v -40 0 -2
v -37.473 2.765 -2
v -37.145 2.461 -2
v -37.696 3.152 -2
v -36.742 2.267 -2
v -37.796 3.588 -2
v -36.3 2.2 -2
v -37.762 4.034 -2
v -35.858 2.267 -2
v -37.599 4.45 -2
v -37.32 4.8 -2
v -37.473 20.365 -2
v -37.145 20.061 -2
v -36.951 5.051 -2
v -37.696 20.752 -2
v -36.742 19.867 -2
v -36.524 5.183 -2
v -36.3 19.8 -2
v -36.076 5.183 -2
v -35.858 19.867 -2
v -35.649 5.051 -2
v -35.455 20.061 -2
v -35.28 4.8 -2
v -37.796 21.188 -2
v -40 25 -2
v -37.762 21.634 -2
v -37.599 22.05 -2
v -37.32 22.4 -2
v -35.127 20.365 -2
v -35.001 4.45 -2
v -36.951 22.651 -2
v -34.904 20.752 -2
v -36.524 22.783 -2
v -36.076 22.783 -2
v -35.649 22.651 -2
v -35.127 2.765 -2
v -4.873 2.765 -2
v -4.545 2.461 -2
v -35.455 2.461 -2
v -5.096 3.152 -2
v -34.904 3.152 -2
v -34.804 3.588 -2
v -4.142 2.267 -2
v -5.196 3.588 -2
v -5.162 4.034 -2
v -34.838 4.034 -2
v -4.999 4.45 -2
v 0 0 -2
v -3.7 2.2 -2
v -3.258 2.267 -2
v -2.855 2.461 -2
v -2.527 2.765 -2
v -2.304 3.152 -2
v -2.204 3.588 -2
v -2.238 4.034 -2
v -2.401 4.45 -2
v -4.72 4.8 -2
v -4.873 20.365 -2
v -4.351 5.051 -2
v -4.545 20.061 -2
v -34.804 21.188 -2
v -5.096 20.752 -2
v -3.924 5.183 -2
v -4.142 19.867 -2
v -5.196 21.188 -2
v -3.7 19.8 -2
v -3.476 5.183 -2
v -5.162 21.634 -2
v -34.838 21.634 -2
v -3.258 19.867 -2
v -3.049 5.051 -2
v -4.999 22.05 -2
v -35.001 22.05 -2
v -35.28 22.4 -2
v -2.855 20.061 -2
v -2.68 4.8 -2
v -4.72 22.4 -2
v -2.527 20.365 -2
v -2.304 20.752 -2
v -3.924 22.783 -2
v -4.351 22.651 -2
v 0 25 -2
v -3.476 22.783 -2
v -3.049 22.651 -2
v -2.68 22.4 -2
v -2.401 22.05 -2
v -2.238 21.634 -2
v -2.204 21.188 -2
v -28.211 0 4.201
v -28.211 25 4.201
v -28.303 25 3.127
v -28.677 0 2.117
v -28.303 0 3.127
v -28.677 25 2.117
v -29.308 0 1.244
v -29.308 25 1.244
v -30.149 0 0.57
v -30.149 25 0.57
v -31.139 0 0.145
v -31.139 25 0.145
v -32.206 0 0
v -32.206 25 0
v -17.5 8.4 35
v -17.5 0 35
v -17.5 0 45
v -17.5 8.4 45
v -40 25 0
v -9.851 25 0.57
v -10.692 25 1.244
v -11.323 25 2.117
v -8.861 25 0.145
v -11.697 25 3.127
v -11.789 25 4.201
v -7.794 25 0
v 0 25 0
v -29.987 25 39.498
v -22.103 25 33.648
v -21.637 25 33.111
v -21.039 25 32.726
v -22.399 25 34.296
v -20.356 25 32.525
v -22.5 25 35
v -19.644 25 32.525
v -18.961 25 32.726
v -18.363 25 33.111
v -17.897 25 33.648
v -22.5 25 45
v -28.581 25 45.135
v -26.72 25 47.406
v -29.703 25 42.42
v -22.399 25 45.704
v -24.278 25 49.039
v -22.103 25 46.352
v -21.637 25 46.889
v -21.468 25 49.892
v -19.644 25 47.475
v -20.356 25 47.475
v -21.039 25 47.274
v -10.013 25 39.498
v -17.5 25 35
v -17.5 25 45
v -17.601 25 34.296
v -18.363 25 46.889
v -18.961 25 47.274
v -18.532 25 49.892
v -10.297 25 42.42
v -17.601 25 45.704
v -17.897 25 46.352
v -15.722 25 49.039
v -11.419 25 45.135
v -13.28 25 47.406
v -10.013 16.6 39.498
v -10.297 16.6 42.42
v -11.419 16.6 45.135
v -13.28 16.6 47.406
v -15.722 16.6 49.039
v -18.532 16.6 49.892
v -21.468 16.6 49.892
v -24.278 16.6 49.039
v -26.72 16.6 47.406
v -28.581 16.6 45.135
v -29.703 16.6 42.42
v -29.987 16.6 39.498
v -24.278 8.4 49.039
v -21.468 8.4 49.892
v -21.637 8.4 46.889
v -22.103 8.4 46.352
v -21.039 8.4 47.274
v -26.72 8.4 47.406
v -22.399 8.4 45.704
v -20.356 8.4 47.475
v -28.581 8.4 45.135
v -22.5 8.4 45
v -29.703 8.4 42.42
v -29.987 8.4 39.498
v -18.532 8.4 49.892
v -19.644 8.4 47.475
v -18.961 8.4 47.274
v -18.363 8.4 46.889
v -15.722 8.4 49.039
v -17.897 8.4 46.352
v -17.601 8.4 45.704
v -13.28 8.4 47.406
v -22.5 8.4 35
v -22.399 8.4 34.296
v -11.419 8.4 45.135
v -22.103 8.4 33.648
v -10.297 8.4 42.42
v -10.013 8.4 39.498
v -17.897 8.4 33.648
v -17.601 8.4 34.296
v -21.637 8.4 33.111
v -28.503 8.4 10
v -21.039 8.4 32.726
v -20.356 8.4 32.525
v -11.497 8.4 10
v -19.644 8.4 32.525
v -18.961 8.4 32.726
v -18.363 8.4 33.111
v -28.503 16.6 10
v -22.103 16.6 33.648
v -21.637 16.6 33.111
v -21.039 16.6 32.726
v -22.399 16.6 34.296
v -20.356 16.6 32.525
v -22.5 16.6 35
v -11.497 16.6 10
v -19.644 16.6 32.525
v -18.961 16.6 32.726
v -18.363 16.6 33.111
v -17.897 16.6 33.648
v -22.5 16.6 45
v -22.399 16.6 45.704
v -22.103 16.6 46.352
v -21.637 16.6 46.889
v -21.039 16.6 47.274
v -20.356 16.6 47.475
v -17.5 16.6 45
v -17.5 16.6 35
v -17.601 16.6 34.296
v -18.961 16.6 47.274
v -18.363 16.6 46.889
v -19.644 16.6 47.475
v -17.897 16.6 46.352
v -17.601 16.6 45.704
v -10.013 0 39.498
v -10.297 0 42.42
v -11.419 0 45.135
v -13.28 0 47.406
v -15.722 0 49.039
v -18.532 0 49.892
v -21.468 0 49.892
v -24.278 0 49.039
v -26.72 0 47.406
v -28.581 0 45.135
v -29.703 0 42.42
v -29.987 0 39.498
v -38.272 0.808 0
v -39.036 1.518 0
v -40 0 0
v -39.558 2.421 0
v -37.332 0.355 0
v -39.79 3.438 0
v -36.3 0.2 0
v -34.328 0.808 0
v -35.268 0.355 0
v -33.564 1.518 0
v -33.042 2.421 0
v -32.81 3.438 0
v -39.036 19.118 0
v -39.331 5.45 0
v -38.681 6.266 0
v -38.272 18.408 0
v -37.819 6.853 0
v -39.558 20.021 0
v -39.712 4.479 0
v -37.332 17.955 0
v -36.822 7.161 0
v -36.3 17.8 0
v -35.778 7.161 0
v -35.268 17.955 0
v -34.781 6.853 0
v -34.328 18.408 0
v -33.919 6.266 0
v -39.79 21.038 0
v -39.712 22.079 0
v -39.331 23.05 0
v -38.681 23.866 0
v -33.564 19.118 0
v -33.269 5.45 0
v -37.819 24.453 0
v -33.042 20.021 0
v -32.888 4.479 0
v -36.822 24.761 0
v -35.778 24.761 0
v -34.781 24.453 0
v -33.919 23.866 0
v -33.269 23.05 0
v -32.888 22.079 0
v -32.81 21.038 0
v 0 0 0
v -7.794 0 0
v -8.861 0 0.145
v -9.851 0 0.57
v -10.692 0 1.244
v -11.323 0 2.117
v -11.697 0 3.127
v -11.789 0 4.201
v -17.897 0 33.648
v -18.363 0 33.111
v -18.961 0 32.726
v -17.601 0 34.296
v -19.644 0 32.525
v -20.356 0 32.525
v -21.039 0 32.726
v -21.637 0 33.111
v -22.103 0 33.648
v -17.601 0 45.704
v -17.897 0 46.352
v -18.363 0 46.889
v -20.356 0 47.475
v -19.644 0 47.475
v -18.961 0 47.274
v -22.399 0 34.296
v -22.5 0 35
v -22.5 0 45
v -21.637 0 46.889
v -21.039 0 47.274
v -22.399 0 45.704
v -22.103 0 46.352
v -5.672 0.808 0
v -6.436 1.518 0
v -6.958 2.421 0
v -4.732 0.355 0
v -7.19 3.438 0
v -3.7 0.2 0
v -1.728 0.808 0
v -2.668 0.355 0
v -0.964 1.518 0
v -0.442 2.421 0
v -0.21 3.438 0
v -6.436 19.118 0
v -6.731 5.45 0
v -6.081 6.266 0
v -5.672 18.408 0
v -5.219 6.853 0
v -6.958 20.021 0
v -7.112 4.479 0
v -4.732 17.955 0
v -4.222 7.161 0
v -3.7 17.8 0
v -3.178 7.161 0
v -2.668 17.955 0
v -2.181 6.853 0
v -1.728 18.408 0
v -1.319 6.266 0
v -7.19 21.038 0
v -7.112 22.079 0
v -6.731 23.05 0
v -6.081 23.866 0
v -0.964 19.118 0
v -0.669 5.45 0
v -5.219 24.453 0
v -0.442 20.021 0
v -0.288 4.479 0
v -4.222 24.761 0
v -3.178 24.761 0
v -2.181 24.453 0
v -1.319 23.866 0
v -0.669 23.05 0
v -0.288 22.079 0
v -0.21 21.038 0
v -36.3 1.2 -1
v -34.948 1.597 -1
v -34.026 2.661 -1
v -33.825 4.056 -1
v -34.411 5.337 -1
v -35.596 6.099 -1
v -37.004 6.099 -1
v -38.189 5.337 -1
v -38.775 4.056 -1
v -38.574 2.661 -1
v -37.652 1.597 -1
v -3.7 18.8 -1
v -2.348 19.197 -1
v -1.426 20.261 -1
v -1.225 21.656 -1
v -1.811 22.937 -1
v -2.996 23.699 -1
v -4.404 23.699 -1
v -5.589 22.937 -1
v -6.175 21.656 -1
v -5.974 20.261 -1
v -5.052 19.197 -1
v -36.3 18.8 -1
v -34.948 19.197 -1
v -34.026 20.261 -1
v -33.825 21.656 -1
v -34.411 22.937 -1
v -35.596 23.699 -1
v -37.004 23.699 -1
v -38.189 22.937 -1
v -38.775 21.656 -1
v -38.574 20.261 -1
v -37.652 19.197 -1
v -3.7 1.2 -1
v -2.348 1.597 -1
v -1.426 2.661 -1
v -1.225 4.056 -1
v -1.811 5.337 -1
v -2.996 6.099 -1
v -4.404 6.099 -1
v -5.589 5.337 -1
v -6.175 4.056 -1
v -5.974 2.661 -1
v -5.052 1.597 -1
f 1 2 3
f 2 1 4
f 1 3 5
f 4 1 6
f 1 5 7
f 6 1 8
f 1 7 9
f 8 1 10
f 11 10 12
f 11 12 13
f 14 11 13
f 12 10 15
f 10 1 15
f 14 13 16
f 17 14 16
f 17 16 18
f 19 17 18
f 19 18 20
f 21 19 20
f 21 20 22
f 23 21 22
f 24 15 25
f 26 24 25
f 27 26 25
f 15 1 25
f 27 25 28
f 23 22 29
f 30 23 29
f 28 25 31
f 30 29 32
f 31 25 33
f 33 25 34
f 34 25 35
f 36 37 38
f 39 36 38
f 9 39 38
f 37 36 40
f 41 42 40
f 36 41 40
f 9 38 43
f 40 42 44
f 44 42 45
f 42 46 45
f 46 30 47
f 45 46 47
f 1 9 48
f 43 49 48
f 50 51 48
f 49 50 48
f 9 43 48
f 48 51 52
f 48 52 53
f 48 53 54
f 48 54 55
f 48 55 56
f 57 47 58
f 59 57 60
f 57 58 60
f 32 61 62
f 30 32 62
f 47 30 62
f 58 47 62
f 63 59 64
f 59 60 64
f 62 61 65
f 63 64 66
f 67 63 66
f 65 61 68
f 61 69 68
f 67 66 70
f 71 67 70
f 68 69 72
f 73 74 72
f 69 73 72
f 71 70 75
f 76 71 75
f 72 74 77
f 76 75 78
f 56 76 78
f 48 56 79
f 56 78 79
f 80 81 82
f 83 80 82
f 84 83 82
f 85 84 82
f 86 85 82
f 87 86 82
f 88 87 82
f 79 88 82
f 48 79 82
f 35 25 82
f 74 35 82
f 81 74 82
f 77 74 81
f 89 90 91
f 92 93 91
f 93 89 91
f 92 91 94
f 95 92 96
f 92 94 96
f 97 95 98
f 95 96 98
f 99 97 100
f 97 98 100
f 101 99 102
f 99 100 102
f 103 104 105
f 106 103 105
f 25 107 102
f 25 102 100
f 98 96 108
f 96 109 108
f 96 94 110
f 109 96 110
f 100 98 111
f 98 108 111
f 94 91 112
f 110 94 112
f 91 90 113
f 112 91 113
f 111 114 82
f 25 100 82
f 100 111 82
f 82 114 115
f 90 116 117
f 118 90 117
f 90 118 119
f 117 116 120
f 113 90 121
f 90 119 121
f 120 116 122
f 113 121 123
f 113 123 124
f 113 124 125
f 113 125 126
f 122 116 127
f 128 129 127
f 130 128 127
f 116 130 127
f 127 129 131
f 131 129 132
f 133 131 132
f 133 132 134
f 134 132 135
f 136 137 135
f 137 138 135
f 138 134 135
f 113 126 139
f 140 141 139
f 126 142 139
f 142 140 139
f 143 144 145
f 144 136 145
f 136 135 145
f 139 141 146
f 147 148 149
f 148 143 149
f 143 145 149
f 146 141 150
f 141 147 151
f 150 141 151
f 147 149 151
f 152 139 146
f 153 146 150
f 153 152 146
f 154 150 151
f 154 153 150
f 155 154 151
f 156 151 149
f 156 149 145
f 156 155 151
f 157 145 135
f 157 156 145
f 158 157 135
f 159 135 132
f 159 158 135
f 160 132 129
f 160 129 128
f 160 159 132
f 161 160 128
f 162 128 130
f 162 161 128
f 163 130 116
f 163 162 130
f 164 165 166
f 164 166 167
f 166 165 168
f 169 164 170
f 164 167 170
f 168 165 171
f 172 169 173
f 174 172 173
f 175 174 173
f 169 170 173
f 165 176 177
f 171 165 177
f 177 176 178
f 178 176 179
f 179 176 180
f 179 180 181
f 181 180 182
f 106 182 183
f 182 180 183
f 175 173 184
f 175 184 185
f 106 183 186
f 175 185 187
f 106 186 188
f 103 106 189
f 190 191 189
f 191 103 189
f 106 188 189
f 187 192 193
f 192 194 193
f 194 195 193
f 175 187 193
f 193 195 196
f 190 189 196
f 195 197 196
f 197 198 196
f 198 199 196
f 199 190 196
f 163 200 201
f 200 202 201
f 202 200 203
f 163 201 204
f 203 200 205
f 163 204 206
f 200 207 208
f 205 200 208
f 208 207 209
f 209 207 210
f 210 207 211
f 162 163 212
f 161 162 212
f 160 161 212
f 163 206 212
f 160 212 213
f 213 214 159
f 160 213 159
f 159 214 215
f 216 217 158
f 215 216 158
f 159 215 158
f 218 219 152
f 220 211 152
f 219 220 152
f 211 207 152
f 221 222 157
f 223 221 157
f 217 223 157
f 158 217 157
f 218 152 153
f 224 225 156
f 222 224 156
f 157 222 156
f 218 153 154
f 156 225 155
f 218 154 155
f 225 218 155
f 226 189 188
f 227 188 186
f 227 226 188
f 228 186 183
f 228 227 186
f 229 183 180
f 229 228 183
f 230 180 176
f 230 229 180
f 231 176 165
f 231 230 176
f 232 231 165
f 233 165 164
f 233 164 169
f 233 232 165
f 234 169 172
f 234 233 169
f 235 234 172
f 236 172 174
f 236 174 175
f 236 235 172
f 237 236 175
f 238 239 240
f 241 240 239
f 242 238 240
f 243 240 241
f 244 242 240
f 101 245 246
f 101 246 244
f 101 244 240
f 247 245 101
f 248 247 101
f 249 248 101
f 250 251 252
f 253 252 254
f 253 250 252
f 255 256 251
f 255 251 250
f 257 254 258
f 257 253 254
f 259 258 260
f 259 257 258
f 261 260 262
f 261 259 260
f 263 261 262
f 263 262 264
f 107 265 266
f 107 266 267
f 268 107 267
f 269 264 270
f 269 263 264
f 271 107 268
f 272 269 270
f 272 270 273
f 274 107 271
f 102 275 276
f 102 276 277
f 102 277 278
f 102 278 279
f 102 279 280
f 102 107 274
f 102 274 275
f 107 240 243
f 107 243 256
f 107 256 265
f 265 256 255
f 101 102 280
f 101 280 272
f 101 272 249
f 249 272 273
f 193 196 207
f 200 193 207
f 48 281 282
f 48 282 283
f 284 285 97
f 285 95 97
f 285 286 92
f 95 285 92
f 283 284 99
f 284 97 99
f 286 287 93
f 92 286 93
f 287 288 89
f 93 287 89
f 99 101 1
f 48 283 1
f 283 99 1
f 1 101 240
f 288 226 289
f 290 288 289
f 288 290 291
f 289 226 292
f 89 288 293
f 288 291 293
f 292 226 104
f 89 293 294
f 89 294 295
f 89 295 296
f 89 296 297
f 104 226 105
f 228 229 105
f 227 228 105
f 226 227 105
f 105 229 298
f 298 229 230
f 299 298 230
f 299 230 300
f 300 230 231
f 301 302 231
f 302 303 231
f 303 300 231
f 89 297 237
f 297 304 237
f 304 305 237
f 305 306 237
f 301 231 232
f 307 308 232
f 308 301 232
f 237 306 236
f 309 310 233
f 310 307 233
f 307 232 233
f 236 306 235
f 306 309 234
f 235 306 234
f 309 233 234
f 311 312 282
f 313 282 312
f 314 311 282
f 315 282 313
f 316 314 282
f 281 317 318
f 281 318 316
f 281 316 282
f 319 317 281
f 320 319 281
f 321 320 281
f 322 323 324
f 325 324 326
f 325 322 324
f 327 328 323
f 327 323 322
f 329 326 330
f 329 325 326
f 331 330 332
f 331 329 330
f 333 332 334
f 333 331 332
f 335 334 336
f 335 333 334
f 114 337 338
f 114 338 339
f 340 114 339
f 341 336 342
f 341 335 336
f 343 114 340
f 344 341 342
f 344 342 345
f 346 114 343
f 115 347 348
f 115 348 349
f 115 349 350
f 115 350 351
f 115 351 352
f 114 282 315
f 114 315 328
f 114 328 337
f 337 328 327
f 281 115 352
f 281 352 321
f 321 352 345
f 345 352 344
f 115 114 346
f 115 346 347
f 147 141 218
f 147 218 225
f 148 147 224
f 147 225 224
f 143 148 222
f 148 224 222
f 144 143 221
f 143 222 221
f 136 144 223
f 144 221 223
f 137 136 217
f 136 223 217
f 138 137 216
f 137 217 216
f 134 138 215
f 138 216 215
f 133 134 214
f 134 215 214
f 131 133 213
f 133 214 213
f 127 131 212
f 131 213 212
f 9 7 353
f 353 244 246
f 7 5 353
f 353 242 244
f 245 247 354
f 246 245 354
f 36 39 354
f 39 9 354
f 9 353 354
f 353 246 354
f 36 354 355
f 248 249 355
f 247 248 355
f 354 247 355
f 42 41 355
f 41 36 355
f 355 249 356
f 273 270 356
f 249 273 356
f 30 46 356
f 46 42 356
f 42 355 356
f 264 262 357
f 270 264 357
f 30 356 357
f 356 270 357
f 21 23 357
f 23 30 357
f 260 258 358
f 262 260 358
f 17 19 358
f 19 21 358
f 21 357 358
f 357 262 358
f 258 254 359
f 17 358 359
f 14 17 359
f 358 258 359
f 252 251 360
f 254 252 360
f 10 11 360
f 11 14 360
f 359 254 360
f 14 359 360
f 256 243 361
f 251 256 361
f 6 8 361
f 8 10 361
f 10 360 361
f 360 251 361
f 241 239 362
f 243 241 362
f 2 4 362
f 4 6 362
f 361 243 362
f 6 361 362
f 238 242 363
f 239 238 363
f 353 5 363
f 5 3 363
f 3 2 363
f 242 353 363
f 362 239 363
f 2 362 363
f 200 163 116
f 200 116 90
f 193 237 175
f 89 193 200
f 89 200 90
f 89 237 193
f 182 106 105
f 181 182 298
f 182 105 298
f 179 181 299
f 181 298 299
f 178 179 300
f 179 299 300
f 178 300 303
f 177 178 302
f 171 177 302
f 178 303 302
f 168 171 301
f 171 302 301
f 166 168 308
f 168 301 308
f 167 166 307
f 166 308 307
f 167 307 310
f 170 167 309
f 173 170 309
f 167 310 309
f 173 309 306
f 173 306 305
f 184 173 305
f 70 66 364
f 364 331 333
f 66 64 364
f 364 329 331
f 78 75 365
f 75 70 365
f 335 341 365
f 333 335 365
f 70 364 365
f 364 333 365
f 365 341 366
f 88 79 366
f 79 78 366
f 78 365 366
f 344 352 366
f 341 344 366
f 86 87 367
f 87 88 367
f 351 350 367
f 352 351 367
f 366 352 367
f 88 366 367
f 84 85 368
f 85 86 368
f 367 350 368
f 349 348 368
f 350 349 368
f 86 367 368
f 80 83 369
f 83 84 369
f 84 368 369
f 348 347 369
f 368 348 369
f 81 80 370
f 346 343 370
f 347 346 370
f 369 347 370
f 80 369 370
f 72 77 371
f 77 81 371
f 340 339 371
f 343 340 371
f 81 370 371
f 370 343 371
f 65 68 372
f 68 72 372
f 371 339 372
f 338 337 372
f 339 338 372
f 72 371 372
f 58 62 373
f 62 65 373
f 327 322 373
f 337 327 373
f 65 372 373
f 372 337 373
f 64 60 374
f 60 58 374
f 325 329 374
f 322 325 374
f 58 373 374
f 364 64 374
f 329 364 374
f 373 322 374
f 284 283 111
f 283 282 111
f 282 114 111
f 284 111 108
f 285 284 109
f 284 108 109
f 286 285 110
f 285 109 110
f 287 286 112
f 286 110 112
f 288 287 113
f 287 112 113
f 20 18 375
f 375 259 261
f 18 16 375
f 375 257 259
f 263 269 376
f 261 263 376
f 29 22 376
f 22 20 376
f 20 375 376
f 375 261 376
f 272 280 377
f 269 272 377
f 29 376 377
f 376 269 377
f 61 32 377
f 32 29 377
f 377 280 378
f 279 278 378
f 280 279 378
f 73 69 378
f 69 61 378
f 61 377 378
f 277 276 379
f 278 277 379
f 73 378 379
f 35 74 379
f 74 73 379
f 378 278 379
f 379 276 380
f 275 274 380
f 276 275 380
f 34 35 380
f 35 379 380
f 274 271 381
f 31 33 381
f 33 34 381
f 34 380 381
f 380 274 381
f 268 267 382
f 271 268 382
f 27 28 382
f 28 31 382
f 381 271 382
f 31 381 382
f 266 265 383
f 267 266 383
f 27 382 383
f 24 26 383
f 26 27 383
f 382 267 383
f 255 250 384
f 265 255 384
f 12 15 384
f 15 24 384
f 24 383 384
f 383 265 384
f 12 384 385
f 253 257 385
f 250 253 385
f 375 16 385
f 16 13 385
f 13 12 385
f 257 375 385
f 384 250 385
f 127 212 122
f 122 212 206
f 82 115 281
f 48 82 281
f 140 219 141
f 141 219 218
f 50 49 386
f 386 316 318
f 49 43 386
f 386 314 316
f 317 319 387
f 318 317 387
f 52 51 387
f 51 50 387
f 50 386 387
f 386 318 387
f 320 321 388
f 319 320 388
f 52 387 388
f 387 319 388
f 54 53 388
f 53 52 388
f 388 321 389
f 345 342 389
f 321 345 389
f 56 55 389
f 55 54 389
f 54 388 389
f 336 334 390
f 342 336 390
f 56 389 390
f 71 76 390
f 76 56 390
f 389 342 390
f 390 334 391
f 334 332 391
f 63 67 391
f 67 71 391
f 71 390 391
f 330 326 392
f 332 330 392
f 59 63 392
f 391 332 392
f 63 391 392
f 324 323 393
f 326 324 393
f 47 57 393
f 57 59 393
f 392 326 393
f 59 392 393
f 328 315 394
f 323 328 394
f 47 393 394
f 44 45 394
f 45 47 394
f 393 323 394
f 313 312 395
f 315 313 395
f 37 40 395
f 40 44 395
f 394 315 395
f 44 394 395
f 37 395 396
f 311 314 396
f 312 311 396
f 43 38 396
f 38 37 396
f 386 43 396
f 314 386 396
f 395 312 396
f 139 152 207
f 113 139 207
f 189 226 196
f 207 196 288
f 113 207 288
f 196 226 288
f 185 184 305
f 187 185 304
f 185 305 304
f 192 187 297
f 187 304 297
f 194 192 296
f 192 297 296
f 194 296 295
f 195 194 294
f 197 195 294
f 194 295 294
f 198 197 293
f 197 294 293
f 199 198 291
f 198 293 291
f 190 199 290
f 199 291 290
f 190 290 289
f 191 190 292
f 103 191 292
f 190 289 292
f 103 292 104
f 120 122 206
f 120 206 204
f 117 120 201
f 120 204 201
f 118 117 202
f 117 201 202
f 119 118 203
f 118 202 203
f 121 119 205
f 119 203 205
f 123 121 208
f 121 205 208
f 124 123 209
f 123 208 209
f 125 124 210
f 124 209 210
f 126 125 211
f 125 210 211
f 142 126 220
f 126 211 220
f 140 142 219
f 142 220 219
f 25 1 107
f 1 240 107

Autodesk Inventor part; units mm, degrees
ref_plane "YZ Plane" through (0, 0, 0) normal (1, 0, 0) x (0, 1, 0)
ref_plane "XZ Plane" through (0, 0, 0) normal (0, 1, 0) x (-1, 0, 0)
ref_plane "XY Plane" through (0, 0, 0) normal (0, 0, 1) x (1, 0, 0)
sketch "Skizze3" plane through (0, 0, 0) normal (0, 0, 1) x (1, 0, 0)
  line L0 (0, 0) -> (-40, 0)
  line L1 (-40, 0) -> (-40, 25)
  line L2 (-40, 25) -> (0, 25)
  line L3 (0, 25) -> (0, 0)
  point P0 (-3.7, 3.7)
  dimension "d4" = 25
  dimension "d5" = 40
  dimension "d6" = 3.7
  dimension "d7" = 3.7
sketch "Skizze4" plane through (0, 0, 0) normal (0, 1, 0) x (-1, 0, 0)
  line L0 (0, 0) -> (40, 0) projected
  line L1 (20, 0) -> (20, 50)
  line L2 (20, 45) -> (20, 35) construction
  line L3 (22.5, 45) -> (22.5, 35)
  line L4 (17.5, 35) -> (17.5, 45)
  arc A0 (22.5, 45) -> (17.5, 45) centre (20, 45) ccw
  arc A1 (17.5, 35) -> (22.5, 35) centre (20, 35) ccw
  circle A2 centre (20, 40) radius 10
  line L5 (29.9874, 39.4975) -> (28, 0)
  line L6 (10.0126, 39.4975) -> (12, 0)
  dimension "d8" = 50
  dimension "d9" = 10
  dimension "d10" = 5
  dimension "d11" = 10
  dimension "d12" = 8
  dimension "d13" = 8
extrude "Extrusion3" add sketch "Skizze4" along normal blind 25 contours L6 A2 L1 L0 | L1 A2 L5 L0 | A2 L1 A0 L4 A1 | L1 A1 L3 A0 A2
extrude "Extrusion4" add sketch "Skizze3" against normal blind 2
hole "Bohrung1" at (-3.7, 3.7, 0) direction (0, 0, -1) diameter 2.459 depth 8.8 countersink diameter 7 countersink angle 90 thread size "M3x0.5" class "6H" standard "ISO Metric profile"
sketch "Skizze5" plane through (0, 0, 0) normal (1, 0, 0) x (0, 0, -1)
  line L0 (-50, 0) -> (-50, 25) projected
  line L1 (-50, 8.4) -> (-10, 8.4)
  line L2 (-10, 8.4) -> (-10, 16.6)
  line L3 (-10, 16.6) -> (-50, 16.6)
  line L4 (-50, 16.6) -> (-50, 8.4)
  point P0 (0, 0)
  point P1 (-50, 12.5)
  dimension "d25" = 8.2
  dimension "d26" = 40
extrude "Extrusion5" cut sketch "Skizze5" against normal through all
pattern_linear "Rechteckige Anordnung1" count 2 spacing 32.6 along (-1, 0, 0) count 2 spacing 17.6 along (0, 1, 0) of "Bohrung1"
fillet "Rundung1" radius 4 2 edges at (-28, 12.5, 0) (-12, 12.5, 0)
equation "\"d7\" = d6"
equation "\"d13\" = d12"
equation "\"d14\" = d4"
equation "\"d31\" = d5 - 2 * d6"
equation "\"d34\" = d4 - 2 * d7"
properties part number "BT101_trajan20_21"
